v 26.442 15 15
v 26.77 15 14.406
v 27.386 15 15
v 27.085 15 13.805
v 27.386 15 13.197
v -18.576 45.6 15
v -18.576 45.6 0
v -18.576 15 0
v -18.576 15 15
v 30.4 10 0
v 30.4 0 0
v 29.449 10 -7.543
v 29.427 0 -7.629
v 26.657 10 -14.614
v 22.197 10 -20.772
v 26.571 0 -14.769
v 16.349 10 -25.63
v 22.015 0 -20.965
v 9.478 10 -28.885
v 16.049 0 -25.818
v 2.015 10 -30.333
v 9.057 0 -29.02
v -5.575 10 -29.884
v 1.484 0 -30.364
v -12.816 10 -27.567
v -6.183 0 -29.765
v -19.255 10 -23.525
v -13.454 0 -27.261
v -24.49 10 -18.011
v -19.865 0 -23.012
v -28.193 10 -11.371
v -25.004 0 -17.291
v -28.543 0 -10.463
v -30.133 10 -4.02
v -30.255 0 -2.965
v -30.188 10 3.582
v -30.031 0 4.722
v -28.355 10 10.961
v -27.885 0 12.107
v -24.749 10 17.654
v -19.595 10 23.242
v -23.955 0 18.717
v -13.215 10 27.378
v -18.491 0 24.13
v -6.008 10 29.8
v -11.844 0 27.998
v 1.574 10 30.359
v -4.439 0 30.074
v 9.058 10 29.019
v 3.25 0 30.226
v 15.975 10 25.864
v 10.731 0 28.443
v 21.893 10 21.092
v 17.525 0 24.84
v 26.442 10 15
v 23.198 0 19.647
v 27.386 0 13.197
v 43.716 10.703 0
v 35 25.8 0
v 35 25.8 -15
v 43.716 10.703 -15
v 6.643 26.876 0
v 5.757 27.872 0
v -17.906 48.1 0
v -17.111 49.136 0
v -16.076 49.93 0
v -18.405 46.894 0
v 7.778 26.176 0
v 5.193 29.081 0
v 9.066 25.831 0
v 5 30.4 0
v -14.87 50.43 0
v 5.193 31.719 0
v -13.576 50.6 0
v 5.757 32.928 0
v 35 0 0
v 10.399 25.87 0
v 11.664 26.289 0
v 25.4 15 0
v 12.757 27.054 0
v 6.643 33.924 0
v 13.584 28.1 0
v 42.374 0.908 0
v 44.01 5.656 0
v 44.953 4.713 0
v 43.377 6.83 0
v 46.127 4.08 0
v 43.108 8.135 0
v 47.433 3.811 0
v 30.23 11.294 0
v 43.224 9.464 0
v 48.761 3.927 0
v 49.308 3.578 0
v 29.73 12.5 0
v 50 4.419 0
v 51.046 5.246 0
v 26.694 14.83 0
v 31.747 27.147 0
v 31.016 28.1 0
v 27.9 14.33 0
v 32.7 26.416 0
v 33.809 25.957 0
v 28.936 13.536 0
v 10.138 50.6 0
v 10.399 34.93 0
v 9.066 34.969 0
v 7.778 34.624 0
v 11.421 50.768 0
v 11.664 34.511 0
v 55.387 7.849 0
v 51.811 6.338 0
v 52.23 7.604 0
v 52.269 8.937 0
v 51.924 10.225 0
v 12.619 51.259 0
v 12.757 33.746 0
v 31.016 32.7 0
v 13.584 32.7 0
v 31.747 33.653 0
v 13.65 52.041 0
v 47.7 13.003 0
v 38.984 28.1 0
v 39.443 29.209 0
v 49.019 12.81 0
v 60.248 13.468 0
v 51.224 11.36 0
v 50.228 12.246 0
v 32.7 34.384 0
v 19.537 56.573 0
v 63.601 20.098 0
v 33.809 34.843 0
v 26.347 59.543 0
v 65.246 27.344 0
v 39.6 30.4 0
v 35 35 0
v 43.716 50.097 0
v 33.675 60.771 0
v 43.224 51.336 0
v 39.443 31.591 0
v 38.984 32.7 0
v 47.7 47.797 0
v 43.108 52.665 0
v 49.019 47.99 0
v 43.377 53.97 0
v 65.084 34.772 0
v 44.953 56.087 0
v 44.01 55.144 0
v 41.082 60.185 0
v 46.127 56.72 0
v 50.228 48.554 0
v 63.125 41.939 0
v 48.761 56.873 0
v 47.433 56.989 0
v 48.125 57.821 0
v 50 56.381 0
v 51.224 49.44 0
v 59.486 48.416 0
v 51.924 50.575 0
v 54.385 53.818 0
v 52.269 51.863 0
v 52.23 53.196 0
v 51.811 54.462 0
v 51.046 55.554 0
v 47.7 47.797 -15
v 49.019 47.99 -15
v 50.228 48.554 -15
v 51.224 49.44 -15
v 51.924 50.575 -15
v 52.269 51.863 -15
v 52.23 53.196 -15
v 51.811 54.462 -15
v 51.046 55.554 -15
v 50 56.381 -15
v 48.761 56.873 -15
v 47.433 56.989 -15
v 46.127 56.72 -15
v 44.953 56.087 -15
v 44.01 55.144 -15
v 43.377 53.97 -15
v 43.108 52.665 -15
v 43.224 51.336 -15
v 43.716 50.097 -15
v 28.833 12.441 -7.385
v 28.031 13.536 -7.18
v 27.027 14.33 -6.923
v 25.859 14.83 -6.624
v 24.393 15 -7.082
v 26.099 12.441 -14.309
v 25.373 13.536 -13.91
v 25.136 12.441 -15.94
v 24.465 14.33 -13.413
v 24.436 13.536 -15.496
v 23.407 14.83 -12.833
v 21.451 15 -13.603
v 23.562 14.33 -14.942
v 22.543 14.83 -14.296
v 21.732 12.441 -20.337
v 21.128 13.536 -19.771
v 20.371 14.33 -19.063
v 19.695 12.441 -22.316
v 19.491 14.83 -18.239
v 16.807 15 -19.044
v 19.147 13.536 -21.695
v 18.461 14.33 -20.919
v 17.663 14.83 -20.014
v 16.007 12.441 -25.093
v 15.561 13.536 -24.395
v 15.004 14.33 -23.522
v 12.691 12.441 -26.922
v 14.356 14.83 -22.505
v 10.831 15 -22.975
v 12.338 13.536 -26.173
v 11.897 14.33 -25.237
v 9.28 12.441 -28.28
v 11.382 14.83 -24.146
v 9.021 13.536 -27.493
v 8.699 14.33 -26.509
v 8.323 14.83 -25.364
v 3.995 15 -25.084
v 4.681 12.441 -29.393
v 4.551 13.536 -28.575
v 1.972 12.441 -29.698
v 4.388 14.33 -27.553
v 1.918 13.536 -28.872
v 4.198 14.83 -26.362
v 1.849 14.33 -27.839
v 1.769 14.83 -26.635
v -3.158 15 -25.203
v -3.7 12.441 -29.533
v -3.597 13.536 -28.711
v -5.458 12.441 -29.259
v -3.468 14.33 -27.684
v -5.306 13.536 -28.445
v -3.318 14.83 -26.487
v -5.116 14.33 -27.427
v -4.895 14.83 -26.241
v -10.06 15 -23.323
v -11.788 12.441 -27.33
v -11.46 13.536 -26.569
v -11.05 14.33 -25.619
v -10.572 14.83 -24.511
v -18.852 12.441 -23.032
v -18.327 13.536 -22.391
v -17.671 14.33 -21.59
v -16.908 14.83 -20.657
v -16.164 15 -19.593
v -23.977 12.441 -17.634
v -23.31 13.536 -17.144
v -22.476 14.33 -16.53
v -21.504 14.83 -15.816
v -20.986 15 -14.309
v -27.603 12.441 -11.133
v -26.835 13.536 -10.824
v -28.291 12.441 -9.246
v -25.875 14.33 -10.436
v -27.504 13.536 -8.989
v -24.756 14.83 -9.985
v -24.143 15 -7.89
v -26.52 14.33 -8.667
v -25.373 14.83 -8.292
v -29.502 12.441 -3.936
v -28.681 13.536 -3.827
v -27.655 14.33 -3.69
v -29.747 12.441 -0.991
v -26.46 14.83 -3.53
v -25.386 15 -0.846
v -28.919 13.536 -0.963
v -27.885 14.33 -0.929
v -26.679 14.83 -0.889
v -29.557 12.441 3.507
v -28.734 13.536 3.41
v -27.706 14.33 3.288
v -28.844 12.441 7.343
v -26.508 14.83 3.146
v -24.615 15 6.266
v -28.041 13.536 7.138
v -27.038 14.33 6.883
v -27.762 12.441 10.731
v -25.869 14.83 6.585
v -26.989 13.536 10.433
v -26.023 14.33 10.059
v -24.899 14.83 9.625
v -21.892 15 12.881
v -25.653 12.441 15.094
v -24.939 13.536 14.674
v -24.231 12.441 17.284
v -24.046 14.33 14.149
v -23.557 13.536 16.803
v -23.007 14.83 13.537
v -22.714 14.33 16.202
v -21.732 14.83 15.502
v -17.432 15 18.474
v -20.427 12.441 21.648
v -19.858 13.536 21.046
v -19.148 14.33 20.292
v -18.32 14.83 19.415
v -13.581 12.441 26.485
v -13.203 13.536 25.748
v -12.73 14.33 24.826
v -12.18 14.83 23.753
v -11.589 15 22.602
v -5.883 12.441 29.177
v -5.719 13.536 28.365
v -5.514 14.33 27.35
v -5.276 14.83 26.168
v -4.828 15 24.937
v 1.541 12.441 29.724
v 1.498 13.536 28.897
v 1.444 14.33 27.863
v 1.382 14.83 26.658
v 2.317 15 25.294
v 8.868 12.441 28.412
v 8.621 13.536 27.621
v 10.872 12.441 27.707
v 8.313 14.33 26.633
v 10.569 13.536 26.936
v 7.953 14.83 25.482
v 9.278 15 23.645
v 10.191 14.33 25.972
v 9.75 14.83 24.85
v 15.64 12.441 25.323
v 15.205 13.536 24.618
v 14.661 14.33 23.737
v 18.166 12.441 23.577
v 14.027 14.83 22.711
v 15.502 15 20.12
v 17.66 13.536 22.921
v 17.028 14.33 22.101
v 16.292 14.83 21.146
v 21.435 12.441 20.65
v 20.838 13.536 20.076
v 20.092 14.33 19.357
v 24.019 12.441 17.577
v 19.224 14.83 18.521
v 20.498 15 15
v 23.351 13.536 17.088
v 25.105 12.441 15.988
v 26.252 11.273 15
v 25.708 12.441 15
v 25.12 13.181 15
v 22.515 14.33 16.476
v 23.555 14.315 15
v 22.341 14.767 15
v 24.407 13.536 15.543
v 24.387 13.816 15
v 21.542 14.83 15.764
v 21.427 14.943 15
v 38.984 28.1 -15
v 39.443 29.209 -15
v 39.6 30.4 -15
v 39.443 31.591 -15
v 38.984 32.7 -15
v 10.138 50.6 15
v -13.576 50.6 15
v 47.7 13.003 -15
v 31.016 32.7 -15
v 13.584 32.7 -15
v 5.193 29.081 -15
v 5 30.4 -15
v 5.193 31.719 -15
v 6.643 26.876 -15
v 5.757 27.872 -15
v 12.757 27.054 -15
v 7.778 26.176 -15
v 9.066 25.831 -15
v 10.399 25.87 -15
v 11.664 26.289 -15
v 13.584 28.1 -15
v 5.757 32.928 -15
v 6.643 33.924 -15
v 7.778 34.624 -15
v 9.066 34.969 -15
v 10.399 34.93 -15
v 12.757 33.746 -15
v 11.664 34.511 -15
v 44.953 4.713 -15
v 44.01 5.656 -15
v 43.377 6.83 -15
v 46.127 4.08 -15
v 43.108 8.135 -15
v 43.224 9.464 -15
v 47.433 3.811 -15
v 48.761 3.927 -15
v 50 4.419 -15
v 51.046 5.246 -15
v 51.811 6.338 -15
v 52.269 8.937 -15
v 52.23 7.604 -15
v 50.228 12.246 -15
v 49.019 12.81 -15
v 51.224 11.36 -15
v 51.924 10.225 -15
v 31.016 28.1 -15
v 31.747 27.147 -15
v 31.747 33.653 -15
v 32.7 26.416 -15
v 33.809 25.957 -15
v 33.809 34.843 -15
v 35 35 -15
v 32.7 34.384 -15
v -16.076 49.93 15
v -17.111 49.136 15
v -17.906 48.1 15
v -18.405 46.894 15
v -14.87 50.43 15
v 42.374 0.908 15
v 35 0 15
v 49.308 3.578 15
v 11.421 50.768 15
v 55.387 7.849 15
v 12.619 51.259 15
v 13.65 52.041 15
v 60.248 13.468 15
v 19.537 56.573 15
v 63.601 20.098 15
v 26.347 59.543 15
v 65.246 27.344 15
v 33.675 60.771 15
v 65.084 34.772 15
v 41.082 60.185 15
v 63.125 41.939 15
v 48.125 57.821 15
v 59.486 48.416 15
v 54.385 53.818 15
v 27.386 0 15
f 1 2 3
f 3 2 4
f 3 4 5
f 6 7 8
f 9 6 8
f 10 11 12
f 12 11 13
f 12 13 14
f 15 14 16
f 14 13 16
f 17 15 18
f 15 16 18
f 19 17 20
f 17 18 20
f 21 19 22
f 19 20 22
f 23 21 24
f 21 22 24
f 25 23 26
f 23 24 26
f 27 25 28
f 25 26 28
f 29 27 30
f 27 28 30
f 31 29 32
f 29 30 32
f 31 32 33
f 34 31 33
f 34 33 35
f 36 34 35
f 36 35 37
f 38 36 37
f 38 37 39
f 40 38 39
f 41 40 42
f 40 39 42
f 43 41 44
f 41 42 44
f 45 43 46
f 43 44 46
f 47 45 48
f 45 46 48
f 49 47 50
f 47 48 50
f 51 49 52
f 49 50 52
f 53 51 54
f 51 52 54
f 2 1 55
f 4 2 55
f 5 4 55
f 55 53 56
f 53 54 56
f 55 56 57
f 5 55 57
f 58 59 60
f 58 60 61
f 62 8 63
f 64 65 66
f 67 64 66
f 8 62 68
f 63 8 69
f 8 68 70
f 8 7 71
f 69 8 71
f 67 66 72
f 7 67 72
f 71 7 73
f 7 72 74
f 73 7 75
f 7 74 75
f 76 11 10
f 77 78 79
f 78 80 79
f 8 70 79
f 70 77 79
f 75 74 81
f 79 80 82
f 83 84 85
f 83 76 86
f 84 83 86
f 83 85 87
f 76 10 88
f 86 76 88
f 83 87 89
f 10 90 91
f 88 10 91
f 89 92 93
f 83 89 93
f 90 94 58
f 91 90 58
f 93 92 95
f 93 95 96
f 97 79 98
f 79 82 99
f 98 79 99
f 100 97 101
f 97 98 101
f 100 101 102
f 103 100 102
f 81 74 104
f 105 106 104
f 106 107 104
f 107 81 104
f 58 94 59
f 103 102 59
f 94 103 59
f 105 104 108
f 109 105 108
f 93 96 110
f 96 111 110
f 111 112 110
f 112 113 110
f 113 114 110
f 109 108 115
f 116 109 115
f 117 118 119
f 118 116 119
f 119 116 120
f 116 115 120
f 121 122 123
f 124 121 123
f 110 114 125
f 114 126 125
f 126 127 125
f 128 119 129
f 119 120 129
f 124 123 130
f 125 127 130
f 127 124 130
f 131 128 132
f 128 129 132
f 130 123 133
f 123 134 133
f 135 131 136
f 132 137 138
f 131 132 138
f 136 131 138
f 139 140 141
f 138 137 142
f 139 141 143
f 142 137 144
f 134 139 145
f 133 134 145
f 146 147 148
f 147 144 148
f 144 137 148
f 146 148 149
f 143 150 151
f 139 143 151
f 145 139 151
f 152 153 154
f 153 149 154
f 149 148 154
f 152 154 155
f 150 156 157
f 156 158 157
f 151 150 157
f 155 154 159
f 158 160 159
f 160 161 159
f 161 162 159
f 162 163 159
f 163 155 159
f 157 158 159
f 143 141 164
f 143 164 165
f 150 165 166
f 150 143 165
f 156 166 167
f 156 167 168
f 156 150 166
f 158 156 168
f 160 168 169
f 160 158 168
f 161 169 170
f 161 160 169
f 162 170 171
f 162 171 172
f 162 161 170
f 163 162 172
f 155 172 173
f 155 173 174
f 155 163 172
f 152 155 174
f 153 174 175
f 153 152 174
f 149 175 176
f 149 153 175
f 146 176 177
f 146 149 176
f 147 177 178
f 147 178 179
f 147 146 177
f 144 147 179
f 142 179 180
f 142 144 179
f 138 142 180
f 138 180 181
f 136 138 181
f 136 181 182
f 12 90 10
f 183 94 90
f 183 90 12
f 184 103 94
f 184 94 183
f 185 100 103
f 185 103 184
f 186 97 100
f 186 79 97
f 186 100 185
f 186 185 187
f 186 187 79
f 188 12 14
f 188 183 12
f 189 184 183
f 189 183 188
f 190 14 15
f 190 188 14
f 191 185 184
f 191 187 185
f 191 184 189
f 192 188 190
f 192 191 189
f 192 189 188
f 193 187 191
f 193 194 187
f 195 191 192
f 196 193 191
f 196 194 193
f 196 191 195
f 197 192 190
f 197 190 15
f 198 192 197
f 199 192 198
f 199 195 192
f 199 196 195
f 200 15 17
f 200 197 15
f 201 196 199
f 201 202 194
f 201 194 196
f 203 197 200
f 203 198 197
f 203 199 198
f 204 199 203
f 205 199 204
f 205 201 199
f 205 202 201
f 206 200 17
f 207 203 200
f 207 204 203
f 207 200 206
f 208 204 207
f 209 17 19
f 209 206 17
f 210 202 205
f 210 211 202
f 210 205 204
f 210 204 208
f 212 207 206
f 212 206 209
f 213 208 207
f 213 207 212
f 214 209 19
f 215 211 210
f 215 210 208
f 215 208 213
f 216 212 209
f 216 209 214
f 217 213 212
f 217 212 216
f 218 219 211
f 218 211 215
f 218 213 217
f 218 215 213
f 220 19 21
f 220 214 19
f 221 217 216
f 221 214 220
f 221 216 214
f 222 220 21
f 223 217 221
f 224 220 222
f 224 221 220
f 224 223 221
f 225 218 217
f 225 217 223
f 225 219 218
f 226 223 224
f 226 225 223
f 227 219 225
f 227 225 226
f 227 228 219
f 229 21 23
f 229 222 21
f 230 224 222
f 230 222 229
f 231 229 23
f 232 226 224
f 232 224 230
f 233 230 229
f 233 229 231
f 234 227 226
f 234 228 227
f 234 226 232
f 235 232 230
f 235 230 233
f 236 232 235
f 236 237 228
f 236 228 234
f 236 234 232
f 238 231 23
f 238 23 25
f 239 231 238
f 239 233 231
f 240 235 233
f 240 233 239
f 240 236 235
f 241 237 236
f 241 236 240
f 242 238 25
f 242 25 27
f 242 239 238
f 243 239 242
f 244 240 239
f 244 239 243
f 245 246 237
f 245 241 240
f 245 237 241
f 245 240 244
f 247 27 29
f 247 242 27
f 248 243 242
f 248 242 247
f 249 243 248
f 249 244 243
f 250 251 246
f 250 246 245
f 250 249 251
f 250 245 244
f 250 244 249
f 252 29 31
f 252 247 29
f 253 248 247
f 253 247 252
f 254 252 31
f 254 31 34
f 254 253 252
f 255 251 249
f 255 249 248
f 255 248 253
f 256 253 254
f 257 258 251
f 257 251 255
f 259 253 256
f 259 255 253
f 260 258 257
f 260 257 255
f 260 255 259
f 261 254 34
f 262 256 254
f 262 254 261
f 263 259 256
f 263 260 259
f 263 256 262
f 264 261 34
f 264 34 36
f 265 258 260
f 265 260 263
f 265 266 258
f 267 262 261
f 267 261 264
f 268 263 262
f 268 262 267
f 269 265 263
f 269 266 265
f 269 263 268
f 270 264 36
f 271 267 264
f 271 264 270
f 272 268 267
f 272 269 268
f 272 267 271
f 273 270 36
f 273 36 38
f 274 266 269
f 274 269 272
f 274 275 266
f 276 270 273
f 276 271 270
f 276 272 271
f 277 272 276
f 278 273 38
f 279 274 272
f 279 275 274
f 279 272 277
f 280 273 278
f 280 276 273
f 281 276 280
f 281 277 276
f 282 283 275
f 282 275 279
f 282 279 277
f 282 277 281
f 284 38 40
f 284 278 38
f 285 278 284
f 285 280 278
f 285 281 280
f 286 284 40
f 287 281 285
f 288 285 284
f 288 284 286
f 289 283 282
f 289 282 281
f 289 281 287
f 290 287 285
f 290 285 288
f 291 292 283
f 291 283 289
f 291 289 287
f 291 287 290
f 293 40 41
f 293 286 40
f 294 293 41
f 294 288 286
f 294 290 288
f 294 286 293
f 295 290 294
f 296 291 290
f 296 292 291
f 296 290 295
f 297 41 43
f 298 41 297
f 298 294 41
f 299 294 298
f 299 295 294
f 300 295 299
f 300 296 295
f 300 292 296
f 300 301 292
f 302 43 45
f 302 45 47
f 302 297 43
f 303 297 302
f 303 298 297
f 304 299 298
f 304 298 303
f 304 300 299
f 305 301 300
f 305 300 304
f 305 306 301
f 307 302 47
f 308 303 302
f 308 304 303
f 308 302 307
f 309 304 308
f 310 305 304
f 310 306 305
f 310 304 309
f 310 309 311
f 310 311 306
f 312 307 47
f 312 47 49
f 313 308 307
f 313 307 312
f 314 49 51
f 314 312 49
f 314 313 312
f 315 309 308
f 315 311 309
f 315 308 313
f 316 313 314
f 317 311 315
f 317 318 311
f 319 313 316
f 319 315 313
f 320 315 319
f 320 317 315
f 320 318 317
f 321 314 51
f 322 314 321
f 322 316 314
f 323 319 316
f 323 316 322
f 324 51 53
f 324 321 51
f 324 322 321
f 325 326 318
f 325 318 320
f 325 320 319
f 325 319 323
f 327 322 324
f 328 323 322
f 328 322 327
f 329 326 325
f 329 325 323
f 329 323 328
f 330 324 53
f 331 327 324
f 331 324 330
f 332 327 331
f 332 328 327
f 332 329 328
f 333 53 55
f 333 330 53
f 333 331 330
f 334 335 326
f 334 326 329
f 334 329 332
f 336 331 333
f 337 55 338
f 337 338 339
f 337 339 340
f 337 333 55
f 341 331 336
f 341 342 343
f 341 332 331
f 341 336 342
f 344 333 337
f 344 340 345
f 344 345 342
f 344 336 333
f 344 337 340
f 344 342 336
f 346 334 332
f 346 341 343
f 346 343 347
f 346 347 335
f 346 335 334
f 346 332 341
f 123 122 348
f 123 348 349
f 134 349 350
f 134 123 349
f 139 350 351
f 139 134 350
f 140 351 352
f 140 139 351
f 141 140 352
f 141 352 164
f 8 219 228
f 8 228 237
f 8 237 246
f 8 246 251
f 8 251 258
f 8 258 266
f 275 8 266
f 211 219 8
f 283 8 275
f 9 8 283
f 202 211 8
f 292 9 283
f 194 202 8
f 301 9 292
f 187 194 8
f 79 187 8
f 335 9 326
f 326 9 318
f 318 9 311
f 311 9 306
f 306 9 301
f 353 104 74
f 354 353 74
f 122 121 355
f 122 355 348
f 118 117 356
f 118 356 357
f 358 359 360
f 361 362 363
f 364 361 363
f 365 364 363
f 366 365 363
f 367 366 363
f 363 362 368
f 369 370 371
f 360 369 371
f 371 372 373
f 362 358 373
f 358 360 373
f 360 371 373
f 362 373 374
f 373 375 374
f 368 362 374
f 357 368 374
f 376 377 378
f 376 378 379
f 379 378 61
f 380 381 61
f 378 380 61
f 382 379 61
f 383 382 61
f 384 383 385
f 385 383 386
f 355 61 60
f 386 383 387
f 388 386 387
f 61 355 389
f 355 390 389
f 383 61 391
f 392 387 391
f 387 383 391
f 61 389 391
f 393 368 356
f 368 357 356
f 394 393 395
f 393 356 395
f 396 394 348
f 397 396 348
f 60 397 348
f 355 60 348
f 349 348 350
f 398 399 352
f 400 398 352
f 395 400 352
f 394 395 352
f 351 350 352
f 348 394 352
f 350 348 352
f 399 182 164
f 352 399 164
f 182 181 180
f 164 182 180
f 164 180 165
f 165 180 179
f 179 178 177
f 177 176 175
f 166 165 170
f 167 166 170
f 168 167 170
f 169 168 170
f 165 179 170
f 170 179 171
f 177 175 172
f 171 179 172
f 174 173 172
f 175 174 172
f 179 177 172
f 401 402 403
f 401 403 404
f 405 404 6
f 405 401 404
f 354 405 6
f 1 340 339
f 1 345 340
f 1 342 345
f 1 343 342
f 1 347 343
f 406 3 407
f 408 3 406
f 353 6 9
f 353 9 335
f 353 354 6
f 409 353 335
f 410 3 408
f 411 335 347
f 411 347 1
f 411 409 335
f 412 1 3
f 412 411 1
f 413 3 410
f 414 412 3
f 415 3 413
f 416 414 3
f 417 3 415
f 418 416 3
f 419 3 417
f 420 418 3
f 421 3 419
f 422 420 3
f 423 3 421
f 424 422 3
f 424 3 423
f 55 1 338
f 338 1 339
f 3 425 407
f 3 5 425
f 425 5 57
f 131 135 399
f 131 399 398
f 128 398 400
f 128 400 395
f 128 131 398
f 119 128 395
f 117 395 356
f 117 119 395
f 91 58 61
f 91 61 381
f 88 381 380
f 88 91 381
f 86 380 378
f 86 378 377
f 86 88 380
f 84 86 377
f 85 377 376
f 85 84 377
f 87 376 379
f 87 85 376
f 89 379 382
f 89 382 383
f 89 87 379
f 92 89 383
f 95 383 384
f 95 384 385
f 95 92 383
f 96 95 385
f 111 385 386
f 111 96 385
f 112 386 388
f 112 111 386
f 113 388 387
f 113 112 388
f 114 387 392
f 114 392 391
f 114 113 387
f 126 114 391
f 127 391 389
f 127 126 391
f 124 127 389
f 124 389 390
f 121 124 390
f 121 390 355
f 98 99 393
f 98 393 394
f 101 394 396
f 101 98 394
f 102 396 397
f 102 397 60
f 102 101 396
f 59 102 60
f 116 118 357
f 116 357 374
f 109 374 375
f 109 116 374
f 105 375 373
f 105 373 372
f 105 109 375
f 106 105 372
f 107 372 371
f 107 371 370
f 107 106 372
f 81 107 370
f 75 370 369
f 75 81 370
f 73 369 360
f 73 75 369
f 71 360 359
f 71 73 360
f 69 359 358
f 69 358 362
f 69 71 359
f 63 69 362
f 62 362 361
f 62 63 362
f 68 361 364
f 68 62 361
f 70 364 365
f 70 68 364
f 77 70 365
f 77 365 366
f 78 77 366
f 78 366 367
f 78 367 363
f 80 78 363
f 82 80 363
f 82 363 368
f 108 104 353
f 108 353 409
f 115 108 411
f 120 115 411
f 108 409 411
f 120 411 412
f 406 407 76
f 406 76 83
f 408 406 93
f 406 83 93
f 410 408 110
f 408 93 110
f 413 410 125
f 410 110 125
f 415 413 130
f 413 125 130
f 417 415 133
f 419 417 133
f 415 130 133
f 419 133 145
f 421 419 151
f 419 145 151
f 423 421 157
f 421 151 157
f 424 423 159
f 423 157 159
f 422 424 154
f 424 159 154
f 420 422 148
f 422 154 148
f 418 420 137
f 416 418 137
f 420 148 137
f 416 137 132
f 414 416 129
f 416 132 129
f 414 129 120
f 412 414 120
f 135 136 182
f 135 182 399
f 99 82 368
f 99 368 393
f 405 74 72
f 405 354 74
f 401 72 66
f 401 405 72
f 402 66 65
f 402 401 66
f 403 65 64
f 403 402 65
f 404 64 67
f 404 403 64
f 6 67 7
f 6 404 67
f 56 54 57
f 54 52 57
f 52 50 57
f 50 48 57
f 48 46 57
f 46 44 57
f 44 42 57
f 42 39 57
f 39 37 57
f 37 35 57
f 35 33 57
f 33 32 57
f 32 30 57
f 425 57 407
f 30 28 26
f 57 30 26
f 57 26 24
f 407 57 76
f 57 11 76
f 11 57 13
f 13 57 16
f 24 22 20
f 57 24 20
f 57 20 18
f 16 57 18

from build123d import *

# Parameters (mm, degrees)
SKETCH1_R           = 30.4
BOSS_EXTRUDE1_DEPTH = 15
BOSS_EXTRUDE7_DEPTH = 15
FILLET2_R           = 5
BOSS_EXTRUDE8_DEPTH = 15


with BuildPart() as part:
    # Sketch1 → Boss-Extrude1 (new body)
    with BuildSketch(Plane(origin=(0, 0, 0), x_dir=(1, 0, 0), z_dir=(0, 1, 0))):
        Circle(SKETCH1_R)
    extrude(amount=BOSS_EXTRUDE1_DEPTH)

    # Sketch2 → Boss-Extrude7 (add)
    with BuildSketch(Plane.XY):
        with BuildLine():
            Line((12.281826966, 50.600114208), (-18.575808631, 50.600114208))
            Line((-18.575808631, 50.600114208), (-18.575808631, 15))
            Line((-18.575808631, 15), (27.386025108, 15))
            Line((27.386025108, 15), (27.386025108, 0))
            Line((27.386025108, 0), (35, 0))
            ThreePointArc((35, 0), (62.733044116, 42.851436224), (12.281826966, 50.600114208))
        make_face()
    extrude(amount=BOSS_EXTRUDE7_DEPTH)

    # Fillet2
    fillet2_edges = [part.edges().sort_by_distance(p)[0] for p in [
        (-18.575808631, 50.600114208, 7.5),
        (12.281826966, 50.600114208, 7.5),
        (-29.393755023, 15, -7.756749685),
    ]]
    fillet(fillet2_edges, radius=FILLET2_R)

    # Sketch4 → Boss-Extrude8 (add)
    with BuildSketch(Plane(origin=(0, 0, 0), x_dir=(-1, 0, 0), z_dir=(0, 0, -1))):
        with BuildLine():
            Line((-43.716283143, 50.097045256), (-35, 35))
            ThreePointArc((-35, 35), (-32.7, 34.383716857), (-31.016283143, 32.7))
            Line((-31.016283143, 32.7), (-13.583716857, 32.7))
            ThreePointArc((-13.583716857, 32.7), (-5, 30.4), (-13.583716857, 28.1))
            Line((-13.583716857, 28.1), (-31.016283143, 28.1))
            ThreePointArc((-31.016283143, 28.1), (-32.7, 26.416283143), (-35, 25.8))
            Line((-35, 25.8), (-43.716283143, 10.702954744))
            ThreePointArc((-43.716283143, 10.702954744), (-50, 4.419237886), (-47.7, 13.002954744))
            Line((-47.7, 13.002954744), (-38.983716857, 28.1))
            ThreePointArc((-38.983716857, 28.1), (-39.6, 30.4), (-38.983716857, 32.7))
            Line((-38.983716857, 32.7), (-47.7, 47.797045256))
            ThreePointArc((-47.7, 47.797045256), (-50, 56.380762114), (-43.716283143, 50.097045256))
        make_face()
    extrude(amount=BOSS_EXTRUDE8_DEPTH)


solid = part.part
